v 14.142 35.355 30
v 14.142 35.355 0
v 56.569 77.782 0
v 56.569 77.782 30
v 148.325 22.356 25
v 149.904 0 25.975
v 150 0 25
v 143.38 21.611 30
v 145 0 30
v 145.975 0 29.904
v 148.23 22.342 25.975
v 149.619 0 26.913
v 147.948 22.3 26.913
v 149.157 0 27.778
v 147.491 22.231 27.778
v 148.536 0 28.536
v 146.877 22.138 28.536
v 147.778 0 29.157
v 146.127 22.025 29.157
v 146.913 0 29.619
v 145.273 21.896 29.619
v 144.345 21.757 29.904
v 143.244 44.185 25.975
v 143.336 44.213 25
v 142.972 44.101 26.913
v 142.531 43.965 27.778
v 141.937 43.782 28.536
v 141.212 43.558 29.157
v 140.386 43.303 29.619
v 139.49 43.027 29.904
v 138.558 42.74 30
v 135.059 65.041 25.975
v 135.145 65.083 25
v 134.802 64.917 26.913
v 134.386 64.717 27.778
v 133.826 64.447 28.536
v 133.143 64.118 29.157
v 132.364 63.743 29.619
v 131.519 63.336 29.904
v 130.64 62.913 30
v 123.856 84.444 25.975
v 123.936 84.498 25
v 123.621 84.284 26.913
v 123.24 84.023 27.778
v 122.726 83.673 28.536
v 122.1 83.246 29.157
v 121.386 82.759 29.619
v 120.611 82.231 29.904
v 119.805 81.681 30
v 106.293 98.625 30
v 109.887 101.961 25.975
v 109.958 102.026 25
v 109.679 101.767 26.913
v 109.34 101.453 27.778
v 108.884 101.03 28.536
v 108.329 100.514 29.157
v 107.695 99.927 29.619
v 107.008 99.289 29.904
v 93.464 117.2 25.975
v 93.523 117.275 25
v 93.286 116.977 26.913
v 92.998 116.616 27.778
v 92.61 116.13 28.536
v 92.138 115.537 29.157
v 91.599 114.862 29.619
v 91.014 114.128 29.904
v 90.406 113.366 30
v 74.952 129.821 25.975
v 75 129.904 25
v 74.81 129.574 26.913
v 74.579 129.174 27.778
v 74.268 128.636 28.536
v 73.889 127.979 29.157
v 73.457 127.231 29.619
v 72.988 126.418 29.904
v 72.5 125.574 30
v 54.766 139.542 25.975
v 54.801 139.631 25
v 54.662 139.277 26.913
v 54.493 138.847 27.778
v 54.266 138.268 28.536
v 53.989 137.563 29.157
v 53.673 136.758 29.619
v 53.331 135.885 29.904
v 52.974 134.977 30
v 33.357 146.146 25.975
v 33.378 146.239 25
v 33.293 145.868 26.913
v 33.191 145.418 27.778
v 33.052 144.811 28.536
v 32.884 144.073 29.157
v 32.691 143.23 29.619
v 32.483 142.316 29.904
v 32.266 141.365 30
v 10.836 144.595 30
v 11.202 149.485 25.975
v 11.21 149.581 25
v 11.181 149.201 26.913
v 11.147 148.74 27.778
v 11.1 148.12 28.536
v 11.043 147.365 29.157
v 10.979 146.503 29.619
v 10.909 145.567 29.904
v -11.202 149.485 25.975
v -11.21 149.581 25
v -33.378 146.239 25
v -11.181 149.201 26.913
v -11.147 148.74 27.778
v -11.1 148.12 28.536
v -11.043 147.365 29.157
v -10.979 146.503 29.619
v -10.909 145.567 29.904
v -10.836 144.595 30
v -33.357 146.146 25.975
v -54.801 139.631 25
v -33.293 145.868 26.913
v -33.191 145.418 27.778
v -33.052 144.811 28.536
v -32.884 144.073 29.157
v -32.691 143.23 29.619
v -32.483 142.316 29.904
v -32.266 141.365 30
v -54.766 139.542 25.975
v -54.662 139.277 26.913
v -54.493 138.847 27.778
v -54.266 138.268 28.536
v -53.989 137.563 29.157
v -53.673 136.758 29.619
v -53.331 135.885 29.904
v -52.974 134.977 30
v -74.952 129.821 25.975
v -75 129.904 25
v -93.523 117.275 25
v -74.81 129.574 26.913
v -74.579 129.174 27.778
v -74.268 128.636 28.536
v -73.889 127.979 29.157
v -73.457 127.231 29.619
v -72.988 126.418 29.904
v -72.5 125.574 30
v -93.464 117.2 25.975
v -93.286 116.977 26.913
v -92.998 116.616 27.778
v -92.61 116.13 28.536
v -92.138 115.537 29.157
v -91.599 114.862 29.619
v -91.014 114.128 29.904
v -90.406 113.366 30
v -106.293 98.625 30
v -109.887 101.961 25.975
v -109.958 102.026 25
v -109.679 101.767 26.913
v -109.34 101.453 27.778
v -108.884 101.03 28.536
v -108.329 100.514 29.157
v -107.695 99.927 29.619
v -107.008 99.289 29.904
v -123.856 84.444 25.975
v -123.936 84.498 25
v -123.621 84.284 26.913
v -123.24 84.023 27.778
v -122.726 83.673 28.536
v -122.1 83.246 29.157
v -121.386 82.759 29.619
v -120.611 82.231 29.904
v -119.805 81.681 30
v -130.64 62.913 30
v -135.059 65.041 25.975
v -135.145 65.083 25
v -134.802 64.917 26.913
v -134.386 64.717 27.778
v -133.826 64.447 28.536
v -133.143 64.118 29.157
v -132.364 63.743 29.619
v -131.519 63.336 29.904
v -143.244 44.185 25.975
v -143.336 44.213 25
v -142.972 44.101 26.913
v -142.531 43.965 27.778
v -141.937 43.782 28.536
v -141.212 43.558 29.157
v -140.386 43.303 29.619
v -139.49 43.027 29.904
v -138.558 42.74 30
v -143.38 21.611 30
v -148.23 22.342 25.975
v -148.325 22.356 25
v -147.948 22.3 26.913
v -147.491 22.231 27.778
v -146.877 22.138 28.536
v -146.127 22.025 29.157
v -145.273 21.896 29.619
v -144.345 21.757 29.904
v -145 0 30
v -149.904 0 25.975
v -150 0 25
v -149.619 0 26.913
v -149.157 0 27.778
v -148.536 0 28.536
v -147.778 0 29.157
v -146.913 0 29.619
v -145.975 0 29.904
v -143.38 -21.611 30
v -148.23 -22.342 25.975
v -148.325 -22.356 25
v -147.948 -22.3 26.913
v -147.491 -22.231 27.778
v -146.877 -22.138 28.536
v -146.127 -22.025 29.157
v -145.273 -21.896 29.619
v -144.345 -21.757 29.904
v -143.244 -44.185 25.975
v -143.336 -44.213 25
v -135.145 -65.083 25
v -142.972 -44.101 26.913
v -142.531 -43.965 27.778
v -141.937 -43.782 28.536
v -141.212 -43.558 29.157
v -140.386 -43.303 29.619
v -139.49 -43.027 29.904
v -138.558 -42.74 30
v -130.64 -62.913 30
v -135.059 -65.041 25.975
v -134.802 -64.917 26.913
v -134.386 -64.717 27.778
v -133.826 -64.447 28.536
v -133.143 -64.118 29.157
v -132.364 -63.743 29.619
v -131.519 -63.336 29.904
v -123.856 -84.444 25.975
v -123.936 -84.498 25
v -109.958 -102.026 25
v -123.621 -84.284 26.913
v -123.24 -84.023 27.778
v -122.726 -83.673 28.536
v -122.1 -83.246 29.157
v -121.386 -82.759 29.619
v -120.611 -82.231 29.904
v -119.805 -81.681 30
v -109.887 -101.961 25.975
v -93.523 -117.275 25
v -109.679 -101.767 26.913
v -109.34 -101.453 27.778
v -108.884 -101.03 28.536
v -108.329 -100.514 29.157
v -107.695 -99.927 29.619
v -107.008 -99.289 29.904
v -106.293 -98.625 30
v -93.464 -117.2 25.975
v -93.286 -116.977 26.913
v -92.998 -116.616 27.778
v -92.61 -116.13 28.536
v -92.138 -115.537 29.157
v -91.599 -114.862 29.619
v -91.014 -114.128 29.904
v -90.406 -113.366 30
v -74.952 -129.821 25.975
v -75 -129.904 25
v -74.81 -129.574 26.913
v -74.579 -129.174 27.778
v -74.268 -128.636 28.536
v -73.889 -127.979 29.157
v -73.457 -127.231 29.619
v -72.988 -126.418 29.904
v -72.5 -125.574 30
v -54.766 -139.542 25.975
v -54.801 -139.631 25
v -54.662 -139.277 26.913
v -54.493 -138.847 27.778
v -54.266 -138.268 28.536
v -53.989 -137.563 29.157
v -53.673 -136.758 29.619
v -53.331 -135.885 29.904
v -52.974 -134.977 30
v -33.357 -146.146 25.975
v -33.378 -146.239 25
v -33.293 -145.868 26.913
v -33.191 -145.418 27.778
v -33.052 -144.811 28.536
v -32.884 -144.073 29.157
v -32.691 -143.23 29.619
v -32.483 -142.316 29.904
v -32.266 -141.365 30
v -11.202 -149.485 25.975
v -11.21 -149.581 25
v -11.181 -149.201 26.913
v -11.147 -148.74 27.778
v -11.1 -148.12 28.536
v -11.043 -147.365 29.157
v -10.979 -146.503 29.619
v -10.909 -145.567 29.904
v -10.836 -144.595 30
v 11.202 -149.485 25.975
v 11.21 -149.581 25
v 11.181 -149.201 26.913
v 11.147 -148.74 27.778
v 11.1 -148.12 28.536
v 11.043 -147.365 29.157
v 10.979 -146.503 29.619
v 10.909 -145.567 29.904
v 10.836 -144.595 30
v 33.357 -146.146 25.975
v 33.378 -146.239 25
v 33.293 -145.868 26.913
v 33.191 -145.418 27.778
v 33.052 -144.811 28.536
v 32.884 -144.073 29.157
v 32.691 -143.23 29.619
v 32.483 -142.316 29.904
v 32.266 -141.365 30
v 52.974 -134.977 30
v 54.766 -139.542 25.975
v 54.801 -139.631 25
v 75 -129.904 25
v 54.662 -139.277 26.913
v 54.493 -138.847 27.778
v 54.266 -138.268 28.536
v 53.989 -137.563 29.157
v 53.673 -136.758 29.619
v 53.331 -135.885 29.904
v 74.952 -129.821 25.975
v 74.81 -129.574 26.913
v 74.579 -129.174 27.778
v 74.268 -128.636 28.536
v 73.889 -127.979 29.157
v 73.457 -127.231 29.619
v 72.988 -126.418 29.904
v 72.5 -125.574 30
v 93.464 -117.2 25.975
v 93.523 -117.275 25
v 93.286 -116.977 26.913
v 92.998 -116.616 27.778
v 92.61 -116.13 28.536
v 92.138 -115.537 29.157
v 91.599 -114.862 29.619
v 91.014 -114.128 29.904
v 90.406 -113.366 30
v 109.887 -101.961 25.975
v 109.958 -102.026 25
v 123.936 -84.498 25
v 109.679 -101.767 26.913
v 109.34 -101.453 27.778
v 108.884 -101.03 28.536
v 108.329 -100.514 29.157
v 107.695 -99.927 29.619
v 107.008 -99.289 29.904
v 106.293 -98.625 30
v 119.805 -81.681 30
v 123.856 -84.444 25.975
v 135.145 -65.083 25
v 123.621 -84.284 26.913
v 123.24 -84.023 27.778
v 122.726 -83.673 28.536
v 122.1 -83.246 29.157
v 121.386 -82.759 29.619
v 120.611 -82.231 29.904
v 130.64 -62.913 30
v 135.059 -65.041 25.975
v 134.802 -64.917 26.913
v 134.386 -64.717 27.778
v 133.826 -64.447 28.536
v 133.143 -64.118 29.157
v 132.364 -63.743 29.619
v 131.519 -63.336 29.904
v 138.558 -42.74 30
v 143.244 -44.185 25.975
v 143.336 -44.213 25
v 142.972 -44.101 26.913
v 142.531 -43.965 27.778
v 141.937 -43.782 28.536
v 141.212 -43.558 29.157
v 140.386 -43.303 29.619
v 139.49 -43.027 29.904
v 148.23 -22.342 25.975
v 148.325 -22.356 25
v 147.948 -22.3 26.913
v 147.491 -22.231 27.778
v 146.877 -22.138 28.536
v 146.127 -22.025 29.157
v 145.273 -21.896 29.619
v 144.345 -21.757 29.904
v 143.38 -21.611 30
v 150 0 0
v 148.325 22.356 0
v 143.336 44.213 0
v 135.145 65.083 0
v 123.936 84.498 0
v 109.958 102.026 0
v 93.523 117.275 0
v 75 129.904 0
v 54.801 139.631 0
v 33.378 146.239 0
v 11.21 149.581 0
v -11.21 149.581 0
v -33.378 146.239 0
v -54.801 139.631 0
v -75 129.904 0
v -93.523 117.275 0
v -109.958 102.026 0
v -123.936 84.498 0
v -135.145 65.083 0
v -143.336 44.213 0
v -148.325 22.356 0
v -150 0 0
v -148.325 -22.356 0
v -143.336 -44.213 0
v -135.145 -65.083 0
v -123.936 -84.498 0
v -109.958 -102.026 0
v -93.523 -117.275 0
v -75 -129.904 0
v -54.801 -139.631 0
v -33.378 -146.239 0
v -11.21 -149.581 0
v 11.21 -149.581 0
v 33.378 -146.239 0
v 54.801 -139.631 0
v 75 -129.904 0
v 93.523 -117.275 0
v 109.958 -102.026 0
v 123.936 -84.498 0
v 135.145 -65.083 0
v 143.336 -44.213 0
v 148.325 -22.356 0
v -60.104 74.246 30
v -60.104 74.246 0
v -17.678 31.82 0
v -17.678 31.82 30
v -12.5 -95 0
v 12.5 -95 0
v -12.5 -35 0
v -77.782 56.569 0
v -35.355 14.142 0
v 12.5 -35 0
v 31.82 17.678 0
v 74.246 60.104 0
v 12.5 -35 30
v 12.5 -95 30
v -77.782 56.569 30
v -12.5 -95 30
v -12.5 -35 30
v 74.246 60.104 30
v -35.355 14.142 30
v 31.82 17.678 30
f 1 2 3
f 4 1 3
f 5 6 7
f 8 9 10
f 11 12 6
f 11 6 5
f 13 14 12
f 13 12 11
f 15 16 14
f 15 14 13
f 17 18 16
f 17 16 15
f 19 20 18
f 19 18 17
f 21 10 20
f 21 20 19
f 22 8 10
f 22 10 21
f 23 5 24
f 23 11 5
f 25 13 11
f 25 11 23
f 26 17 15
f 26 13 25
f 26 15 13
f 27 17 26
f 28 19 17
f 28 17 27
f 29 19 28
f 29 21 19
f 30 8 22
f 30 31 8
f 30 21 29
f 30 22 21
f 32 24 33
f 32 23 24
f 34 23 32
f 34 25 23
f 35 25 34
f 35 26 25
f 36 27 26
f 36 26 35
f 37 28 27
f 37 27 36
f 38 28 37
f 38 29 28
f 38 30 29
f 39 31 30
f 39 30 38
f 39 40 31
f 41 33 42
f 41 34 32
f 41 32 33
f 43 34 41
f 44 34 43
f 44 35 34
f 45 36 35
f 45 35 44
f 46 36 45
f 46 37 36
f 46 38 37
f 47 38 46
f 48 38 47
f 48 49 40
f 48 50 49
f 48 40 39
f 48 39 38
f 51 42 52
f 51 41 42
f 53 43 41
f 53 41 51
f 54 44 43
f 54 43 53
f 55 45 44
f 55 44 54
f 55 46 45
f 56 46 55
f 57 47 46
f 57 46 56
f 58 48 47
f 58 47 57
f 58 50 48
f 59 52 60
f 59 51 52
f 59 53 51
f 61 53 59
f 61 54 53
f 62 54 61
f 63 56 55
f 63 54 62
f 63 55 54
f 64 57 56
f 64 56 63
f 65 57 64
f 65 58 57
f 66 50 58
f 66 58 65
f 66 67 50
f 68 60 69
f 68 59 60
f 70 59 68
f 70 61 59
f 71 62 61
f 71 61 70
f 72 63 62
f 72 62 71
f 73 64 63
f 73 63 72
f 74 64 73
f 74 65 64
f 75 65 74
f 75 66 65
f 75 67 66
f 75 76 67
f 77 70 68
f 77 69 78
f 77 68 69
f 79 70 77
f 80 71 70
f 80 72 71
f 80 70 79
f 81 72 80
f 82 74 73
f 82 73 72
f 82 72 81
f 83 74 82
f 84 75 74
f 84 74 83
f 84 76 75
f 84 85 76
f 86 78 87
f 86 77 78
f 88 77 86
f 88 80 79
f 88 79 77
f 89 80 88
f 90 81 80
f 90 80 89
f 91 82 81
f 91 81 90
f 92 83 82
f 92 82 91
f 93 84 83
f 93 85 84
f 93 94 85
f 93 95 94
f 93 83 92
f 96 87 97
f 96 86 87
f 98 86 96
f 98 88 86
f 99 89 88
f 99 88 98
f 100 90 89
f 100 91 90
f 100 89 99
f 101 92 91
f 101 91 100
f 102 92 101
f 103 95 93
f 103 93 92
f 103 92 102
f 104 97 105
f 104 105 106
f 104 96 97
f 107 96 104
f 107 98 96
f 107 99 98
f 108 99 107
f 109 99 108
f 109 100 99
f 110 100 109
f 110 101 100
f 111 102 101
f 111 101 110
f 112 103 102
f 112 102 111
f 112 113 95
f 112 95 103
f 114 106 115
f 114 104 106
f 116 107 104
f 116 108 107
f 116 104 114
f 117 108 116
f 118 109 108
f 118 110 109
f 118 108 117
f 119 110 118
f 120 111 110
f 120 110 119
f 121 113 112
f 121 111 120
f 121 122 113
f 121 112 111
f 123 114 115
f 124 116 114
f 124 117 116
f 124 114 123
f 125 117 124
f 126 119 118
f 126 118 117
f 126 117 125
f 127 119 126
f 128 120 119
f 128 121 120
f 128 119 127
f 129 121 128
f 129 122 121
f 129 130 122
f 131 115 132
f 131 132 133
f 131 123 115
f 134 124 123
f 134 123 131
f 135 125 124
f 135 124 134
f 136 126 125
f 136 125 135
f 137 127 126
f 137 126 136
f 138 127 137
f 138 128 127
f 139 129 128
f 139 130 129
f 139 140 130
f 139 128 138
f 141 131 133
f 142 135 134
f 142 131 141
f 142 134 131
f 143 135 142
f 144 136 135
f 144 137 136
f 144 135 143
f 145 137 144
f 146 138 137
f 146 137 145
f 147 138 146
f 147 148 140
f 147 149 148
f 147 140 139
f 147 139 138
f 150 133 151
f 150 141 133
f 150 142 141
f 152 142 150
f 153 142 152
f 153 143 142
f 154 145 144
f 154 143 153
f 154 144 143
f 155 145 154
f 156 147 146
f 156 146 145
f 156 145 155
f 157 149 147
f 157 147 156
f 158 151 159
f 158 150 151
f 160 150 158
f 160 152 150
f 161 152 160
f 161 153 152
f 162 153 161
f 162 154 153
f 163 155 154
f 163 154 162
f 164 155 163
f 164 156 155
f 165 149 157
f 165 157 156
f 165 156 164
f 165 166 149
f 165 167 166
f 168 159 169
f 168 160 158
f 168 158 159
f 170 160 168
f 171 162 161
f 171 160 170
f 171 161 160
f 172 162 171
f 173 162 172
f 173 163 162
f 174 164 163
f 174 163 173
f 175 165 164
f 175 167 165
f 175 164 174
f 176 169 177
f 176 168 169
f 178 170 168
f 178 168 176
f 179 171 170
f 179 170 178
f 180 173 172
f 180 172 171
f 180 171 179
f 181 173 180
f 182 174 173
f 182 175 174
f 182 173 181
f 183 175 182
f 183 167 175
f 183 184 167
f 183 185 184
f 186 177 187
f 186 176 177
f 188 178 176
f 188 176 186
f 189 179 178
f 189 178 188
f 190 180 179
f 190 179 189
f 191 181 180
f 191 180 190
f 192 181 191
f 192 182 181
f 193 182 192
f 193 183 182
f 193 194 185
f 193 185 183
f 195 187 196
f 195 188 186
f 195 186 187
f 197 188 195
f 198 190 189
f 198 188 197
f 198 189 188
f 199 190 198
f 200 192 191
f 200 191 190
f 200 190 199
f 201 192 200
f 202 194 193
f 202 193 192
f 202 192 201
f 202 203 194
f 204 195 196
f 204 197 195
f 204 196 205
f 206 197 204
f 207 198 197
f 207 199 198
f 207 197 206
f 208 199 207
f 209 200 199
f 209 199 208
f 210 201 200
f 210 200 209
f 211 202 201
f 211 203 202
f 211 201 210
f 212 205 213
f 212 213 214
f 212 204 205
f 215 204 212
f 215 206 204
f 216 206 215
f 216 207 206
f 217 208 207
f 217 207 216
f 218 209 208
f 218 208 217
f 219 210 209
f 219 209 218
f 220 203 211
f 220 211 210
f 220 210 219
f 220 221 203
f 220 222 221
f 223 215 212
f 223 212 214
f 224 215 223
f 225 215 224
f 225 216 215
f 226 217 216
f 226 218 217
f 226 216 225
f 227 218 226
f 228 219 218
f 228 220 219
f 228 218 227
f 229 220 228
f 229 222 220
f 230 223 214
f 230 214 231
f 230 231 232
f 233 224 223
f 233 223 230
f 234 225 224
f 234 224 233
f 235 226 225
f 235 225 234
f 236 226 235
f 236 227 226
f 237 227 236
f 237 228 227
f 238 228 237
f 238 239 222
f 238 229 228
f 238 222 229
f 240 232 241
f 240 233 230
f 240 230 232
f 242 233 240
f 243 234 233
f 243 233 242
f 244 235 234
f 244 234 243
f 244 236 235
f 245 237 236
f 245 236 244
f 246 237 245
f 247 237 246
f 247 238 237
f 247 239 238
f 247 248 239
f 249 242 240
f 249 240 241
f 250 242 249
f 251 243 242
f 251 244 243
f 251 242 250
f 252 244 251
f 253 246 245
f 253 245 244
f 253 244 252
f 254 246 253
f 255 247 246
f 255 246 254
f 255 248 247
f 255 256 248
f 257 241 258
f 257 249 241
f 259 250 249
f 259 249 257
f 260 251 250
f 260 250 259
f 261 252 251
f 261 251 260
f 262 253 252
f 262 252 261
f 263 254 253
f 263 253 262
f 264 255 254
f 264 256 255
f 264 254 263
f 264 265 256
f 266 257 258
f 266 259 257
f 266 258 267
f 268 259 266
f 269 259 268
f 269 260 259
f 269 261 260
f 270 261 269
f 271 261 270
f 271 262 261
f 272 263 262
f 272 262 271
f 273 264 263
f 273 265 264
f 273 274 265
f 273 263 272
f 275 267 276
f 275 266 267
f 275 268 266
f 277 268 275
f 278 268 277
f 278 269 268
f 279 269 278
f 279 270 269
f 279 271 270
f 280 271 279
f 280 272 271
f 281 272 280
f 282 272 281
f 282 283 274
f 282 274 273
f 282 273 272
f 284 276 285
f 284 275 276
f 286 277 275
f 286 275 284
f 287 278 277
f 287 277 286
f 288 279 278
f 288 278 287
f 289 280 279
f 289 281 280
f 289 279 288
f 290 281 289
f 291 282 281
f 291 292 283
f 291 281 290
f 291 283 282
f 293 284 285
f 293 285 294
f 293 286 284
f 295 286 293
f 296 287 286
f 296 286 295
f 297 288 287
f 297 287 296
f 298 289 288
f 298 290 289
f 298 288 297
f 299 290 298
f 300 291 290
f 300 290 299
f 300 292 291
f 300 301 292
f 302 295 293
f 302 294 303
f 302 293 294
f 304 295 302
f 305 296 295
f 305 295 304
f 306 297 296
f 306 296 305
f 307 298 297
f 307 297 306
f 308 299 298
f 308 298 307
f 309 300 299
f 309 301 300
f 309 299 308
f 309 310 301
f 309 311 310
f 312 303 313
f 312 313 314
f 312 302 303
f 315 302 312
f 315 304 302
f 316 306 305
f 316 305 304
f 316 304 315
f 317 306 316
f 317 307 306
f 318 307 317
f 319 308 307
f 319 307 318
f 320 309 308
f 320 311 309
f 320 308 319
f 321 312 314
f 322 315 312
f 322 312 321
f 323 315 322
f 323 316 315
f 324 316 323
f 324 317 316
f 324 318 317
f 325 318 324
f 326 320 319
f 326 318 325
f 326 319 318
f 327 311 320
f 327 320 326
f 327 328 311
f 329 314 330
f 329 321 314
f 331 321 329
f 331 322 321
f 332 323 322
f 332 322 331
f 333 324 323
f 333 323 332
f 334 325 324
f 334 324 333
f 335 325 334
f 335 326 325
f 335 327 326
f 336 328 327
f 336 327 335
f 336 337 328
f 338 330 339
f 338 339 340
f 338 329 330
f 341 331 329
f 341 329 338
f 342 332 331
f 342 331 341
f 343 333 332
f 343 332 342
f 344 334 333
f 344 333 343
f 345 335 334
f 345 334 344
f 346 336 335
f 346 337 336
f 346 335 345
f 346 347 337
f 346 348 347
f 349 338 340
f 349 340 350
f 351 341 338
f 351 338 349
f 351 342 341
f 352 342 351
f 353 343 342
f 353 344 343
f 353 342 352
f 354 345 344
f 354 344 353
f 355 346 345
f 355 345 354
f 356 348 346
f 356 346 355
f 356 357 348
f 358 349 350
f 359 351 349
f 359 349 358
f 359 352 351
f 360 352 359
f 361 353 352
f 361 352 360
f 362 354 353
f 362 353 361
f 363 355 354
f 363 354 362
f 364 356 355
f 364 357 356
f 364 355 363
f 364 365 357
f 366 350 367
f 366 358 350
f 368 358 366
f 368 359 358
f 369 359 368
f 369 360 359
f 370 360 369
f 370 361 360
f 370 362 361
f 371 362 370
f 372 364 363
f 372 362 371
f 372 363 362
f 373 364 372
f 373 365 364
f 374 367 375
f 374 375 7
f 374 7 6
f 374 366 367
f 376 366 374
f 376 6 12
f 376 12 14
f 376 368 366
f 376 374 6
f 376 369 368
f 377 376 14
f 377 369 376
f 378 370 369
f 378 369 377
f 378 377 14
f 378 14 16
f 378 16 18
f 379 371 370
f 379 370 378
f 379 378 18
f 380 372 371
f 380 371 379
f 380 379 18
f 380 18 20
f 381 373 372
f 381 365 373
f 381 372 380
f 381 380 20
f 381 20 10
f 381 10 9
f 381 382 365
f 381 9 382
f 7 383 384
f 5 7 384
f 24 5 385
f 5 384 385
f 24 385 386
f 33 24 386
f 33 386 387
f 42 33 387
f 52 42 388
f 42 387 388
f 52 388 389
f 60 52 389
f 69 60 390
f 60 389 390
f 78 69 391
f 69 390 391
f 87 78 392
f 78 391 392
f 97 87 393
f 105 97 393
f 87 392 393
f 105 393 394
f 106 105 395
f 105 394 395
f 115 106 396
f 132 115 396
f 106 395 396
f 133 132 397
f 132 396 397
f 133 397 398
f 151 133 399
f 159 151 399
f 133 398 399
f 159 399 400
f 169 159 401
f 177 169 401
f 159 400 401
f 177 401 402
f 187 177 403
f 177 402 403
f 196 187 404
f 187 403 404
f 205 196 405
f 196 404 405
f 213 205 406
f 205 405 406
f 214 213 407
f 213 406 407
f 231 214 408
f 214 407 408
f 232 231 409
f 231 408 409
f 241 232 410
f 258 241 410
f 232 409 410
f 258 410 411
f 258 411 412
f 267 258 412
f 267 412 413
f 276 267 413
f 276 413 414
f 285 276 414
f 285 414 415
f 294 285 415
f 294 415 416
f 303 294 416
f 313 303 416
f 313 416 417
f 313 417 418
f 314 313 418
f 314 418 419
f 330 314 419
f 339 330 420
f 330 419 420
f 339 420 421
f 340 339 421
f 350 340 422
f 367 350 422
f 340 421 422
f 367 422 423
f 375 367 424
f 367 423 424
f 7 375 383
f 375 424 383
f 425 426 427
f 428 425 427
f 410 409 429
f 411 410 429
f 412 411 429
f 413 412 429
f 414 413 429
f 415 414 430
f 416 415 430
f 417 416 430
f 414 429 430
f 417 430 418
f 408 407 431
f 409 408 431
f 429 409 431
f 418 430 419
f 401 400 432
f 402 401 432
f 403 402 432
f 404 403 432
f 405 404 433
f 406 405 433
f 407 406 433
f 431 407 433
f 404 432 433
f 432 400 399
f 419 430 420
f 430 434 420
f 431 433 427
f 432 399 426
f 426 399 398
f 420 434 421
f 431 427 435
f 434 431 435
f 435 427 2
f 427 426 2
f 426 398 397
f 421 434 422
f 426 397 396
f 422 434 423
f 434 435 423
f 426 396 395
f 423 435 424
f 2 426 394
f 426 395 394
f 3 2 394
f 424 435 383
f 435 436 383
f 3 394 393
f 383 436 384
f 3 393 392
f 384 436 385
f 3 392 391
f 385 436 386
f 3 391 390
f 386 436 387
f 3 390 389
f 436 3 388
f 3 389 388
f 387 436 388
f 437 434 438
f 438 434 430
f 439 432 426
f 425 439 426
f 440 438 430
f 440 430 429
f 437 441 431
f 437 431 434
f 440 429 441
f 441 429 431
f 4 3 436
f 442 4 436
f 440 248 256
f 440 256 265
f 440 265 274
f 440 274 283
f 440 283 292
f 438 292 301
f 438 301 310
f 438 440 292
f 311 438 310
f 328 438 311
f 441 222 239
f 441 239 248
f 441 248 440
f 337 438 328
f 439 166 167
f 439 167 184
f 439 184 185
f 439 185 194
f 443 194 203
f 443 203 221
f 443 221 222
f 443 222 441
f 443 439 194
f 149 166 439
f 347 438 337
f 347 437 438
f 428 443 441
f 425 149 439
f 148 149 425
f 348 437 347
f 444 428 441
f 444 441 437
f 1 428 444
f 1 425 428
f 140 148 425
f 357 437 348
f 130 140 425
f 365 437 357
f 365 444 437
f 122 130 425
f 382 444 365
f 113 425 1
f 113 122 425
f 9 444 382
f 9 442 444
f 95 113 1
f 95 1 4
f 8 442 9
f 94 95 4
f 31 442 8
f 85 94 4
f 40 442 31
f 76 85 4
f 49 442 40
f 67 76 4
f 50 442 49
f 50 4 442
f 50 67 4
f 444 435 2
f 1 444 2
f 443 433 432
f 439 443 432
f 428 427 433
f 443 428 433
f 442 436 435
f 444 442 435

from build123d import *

# Parameters (mm, degrees)
F0_R     = 150
F1_DEPTH = 30
F2_R     = 5


with BuildPart() as f1:
    # F0 (on Top) → F1 (new body)
    with BuildSketch(Plane.XY):
        Circle(F0_R)
        Polygon((-12.5, -35), (0, -35), (12.5, -35), (12.5, -95), (-12.5, -95), align=None, mode=Mode.SUBTRACT)
        Polygon((-35.355339, 14.142136), (-77.781746, 56.568542), (-60.104076, 74.246212), (-17.67767, 31.819805), align=None, mode=Mode.SUBTRACT)
        Polygon((56.568542, 77.781746), (74.246212, 60.104076), (31.819805, 17.67767), (14.142136, 35.355339), align=None, mode=Mode.SUBTRACT)
    extrude(amount=F1_DEPTH)

    # F2
    f2_edges = [f1.edges().sort_by_distance(p)[0] for p in [
        (-150, 0, 30),
    ]]
    fillet(f2_edges, radius=F2_R)


solid = f1.part
